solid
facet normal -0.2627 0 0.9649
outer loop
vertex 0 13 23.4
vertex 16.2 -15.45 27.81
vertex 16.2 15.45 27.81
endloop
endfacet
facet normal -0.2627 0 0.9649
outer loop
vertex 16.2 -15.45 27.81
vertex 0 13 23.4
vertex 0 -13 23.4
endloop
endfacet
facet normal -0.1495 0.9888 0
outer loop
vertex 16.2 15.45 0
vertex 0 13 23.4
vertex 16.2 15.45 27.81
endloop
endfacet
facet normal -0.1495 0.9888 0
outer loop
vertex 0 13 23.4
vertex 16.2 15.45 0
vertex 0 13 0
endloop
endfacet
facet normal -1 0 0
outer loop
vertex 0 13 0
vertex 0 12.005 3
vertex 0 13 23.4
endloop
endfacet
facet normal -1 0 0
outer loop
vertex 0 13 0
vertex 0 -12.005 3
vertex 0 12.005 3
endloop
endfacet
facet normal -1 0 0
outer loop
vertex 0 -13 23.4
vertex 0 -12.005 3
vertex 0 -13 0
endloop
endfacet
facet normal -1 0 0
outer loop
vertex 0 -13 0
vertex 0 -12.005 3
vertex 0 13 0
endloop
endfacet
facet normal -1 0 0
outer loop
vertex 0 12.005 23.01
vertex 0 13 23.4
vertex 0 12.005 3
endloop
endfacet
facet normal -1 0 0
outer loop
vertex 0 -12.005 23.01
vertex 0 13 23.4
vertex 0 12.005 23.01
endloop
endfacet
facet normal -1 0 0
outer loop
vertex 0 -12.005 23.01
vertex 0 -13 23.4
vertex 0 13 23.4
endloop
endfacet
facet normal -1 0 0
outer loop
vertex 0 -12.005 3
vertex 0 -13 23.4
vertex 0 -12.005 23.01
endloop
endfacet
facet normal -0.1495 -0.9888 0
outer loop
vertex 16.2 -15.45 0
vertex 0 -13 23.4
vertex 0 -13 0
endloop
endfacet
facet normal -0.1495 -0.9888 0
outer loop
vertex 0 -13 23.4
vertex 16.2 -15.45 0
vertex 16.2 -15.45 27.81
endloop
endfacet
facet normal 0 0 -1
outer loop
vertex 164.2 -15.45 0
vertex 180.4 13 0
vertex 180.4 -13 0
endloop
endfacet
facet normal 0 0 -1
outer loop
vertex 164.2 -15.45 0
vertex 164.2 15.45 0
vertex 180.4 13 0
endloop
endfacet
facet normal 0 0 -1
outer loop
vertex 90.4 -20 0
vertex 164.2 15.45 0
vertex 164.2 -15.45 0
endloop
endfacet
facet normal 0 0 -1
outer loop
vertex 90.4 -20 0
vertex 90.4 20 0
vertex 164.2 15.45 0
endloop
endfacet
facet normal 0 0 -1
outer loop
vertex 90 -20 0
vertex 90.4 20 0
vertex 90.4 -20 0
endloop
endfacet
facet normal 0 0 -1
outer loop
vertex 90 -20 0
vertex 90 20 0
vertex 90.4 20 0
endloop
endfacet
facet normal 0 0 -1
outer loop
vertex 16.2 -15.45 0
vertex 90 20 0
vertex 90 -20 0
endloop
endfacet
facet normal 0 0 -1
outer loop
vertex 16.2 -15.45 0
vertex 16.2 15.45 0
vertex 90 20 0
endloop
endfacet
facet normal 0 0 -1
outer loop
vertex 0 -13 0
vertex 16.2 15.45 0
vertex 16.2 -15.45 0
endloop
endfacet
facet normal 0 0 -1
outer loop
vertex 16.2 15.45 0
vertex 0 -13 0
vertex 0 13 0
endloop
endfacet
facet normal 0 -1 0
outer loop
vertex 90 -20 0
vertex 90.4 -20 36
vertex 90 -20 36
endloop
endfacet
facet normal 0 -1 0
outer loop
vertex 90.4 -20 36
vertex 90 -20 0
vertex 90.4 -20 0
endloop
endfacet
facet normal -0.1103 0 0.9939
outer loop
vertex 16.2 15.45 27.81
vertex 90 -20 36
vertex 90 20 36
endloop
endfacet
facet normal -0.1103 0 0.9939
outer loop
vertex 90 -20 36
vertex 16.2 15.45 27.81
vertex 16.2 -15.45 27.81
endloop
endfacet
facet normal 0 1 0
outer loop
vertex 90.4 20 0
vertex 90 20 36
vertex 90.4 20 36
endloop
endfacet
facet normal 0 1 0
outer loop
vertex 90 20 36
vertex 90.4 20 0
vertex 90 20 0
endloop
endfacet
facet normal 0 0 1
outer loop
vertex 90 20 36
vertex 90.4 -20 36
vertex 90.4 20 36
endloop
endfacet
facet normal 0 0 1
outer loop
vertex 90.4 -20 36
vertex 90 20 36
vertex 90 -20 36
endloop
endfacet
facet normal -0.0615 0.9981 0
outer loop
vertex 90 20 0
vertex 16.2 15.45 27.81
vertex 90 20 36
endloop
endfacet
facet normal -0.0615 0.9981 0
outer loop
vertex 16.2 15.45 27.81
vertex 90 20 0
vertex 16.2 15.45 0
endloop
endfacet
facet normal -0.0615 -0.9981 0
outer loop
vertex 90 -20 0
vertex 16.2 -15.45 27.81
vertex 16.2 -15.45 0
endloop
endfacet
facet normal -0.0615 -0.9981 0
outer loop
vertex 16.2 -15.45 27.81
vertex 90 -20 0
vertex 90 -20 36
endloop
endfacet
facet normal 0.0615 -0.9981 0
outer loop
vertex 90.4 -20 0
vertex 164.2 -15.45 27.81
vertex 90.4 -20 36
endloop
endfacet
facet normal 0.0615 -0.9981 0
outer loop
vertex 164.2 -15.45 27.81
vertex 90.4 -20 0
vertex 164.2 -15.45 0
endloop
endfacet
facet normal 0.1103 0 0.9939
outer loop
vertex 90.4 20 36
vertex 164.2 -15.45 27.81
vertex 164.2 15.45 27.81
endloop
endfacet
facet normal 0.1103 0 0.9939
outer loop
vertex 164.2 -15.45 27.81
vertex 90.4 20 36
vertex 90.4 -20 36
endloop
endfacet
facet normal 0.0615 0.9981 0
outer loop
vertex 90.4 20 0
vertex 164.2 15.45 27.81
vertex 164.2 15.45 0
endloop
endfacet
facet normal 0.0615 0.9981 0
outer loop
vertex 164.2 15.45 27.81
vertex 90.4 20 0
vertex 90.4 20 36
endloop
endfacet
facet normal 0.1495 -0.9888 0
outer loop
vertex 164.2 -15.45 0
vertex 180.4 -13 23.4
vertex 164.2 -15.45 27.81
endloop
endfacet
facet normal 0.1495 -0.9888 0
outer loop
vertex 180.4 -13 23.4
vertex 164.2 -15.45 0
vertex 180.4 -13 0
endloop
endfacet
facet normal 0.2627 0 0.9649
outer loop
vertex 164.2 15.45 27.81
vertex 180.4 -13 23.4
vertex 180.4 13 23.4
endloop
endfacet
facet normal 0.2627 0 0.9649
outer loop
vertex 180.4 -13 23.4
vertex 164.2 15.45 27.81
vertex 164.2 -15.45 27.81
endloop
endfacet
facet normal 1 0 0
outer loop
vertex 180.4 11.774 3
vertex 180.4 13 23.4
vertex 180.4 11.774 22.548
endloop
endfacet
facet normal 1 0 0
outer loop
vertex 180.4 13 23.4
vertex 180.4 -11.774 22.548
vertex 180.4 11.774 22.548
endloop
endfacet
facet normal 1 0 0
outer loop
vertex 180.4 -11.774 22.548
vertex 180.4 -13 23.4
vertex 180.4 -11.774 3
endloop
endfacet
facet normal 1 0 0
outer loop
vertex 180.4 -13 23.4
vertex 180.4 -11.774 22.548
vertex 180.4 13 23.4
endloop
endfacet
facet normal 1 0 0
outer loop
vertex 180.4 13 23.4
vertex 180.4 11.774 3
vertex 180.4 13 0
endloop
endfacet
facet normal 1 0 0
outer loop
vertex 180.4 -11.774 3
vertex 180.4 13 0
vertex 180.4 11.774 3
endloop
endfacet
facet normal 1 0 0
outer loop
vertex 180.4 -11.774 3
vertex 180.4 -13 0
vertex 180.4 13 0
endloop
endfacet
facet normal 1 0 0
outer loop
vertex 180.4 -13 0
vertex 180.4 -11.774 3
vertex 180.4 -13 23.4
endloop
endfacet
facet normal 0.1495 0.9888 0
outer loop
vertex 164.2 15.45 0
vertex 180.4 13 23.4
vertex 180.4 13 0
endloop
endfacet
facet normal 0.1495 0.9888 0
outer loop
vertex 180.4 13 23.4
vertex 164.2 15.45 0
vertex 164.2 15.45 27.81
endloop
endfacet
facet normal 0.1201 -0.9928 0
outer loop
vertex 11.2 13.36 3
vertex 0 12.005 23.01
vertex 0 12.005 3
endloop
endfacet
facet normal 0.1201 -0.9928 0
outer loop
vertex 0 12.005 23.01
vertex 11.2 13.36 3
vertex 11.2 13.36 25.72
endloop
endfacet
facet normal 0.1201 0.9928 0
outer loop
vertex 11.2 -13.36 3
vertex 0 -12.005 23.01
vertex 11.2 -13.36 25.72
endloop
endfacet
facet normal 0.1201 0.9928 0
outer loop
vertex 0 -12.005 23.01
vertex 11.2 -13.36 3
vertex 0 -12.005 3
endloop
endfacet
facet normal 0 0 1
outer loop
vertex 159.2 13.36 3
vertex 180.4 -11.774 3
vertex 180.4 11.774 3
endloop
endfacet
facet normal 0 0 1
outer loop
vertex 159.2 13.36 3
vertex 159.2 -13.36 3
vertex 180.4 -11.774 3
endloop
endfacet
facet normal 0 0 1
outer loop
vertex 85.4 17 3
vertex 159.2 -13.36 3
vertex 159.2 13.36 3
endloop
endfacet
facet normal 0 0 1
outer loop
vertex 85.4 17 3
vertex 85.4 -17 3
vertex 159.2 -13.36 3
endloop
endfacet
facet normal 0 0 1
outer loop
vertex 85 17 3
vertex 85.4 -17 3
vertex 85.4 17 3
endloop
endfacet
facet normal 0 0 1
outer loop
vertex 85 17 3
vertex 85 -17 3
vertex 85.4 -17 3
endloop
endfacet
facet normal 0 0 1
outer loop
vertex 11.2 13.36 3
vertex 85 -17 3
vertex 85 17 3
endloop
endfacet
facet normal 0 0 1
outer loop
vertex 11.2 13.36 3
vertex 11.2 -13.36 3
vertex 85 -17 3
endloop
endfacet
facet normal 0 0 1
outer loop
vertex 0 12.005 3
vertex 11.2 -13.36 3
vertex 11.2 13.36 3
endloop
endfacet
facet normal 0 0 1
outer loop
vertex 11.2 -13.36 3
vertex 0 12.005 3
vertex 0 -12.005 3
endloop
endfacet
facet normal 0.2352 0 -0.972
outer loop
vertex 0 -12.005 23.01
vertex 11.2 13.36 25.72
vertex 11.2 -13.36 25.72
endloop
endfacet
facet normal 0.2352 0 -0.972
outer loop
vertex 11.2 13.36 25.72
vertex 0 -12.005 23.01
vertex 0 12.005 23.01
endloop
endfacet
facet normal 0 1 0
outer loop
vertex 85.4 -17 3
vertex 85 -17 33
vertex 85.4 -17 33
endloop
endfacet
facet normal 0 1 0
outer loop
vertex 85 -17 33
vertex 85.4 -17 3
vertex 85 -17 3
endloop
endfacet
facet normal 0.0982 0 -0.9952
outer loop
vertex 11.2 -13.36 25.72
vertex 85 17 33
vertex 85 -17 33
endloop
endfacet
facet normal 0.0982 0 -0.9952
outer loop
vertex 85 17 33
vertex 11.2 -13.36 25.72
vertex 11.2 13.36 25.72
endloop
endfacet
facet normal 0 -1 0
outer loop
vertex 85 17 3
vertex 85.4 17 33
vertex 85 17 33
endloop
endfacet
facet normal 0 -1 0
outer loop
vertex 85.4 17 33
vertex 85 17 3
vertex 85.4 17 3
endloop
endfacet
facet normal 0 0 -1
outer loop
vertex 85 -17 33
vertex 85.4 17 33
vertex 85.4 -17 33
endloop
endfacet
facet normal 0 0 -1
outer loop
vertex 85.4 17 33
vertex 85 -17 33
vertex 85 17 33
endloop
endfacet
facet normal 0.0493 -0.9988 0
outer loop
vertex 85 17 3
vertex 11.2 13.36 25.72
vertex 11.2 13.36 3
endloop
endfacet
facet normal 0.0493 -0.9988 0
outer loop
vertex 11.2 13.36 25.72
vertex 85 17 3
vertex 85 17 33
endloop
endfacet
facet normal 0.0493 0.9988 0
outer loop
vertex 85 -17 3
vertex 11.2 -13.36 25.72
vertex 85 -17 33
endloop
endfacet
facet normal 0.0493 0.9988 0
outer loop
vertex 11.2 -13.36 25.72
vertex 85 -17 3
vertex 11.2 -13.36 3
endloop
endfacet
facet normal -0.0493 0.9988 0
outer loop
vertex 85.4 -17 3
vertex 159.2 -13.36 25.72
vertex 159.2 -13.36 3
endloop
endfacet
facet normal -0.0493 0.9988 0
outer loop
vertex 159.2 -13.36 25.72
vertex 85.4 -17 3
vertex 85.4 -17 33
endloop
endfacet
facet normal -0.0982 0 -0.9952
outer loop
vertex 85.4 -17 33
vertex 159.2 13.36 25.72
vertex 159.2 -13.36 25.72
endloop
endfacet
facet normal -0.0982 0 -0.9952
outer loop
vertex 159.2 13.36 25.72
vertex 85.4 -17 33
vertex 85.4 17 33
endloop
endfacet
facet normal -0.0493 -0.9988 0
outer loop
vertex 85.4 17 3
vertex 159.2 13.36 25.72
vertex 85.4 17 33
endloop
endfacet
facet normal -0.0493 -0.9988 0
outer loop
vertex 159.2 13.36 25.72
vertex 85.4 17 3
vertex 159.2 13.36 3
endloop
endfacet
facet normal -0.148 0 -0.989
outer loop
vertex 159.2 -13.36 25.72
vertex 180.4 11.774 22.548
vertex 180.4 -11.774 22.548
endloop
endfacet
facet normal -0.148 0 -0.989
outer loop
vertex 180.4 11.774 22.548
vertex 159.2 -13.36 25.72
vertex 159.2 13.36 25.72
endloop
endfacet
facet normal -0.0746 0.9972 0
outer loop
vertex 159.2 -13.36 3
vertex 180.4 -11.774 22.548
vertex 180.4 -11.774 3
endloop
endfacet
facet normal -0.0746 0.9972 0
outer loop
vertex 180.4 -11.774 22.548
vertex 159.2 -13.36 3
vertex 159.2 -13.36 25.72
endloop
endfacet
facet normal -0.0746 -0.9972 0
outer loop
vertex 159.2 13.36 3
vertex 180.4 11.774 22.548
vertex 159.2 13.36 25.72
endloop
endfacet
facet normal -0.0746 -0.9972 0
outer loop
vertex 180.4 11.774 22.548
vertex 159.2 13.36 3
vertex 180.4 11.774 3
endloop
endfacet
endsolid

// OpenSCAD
$fn = 32;

// ----------------------------------------------------------------------
// Faired channel: 180 x 40 x 36 mm, 3 mm walls, faired ends
// ----------------------------------------------------------------------

// --- parameters (mm) ---
length = 180;             // channel length
width = 40;               // channel width at mid length
height = 36;              // channel height at mid length
wall = 3;                 // side wall thickness
floor_t = 3;              // floor thickness
end_w = 26;               // faired end width
end_h = 23.4;             // faired end height

difference() {
  union() {
    hull() {
      translate([0, -13, 0]) cube([0.4, 26, 23.4]);
      translate([16.2, -15.45, 0]) cube([0.4, 30.9, 27.81]);
    }
    hull() {
      translate([16.2, -15.45, 0]) cube([0.4, 30.9, 27.81]);
      translate([90, -20, 0]) cube([0.4, 40, 36]);
    }
    hull() {
      translate([90, -20, 0]) cube([0.4, 40, 36]);
      translate([163.8, -15.45, 0]) cube([0.4, 30.9, 27.81]);
    }
    hull() {
      translate([163.8, -15.45, 0]) cube([0.4, 30.9, 27.81]);
      translate([180, -13, 0]) cube([0.4, 26, 23.4]);
    }
  }
  /* cavity, 5 mm proud of both ends so the ports are cut clean */
  hull() {
    translate([-5, -11.4, 3]) cube([0.4, 22.8, 18.8]);
    translate([11.2, -13.36, 3]) cube([0.4, 26.72, 22.72]);
  }
  hull() {
    translate([11.2, -13.36, 3]) cube([0.4, 26.72, 22.72]);
    translate([85, -17, 3]) cube([0.4, 34, 30]);
  }
  hull() {
    translate([85, -17, 3]) cube([0.4, 34, 30]);
    translate([158.8, -13.36, 3]) cube([0.4, 26.72, 22.72]);
  }
  hull() {
    translate([158.8, -13.36, 3]) cube([0.4, 26.72, 22.72]);
    translate([185, -11.4, 3]) cube([0.4, 22.8, 18.8]);
  }
}
